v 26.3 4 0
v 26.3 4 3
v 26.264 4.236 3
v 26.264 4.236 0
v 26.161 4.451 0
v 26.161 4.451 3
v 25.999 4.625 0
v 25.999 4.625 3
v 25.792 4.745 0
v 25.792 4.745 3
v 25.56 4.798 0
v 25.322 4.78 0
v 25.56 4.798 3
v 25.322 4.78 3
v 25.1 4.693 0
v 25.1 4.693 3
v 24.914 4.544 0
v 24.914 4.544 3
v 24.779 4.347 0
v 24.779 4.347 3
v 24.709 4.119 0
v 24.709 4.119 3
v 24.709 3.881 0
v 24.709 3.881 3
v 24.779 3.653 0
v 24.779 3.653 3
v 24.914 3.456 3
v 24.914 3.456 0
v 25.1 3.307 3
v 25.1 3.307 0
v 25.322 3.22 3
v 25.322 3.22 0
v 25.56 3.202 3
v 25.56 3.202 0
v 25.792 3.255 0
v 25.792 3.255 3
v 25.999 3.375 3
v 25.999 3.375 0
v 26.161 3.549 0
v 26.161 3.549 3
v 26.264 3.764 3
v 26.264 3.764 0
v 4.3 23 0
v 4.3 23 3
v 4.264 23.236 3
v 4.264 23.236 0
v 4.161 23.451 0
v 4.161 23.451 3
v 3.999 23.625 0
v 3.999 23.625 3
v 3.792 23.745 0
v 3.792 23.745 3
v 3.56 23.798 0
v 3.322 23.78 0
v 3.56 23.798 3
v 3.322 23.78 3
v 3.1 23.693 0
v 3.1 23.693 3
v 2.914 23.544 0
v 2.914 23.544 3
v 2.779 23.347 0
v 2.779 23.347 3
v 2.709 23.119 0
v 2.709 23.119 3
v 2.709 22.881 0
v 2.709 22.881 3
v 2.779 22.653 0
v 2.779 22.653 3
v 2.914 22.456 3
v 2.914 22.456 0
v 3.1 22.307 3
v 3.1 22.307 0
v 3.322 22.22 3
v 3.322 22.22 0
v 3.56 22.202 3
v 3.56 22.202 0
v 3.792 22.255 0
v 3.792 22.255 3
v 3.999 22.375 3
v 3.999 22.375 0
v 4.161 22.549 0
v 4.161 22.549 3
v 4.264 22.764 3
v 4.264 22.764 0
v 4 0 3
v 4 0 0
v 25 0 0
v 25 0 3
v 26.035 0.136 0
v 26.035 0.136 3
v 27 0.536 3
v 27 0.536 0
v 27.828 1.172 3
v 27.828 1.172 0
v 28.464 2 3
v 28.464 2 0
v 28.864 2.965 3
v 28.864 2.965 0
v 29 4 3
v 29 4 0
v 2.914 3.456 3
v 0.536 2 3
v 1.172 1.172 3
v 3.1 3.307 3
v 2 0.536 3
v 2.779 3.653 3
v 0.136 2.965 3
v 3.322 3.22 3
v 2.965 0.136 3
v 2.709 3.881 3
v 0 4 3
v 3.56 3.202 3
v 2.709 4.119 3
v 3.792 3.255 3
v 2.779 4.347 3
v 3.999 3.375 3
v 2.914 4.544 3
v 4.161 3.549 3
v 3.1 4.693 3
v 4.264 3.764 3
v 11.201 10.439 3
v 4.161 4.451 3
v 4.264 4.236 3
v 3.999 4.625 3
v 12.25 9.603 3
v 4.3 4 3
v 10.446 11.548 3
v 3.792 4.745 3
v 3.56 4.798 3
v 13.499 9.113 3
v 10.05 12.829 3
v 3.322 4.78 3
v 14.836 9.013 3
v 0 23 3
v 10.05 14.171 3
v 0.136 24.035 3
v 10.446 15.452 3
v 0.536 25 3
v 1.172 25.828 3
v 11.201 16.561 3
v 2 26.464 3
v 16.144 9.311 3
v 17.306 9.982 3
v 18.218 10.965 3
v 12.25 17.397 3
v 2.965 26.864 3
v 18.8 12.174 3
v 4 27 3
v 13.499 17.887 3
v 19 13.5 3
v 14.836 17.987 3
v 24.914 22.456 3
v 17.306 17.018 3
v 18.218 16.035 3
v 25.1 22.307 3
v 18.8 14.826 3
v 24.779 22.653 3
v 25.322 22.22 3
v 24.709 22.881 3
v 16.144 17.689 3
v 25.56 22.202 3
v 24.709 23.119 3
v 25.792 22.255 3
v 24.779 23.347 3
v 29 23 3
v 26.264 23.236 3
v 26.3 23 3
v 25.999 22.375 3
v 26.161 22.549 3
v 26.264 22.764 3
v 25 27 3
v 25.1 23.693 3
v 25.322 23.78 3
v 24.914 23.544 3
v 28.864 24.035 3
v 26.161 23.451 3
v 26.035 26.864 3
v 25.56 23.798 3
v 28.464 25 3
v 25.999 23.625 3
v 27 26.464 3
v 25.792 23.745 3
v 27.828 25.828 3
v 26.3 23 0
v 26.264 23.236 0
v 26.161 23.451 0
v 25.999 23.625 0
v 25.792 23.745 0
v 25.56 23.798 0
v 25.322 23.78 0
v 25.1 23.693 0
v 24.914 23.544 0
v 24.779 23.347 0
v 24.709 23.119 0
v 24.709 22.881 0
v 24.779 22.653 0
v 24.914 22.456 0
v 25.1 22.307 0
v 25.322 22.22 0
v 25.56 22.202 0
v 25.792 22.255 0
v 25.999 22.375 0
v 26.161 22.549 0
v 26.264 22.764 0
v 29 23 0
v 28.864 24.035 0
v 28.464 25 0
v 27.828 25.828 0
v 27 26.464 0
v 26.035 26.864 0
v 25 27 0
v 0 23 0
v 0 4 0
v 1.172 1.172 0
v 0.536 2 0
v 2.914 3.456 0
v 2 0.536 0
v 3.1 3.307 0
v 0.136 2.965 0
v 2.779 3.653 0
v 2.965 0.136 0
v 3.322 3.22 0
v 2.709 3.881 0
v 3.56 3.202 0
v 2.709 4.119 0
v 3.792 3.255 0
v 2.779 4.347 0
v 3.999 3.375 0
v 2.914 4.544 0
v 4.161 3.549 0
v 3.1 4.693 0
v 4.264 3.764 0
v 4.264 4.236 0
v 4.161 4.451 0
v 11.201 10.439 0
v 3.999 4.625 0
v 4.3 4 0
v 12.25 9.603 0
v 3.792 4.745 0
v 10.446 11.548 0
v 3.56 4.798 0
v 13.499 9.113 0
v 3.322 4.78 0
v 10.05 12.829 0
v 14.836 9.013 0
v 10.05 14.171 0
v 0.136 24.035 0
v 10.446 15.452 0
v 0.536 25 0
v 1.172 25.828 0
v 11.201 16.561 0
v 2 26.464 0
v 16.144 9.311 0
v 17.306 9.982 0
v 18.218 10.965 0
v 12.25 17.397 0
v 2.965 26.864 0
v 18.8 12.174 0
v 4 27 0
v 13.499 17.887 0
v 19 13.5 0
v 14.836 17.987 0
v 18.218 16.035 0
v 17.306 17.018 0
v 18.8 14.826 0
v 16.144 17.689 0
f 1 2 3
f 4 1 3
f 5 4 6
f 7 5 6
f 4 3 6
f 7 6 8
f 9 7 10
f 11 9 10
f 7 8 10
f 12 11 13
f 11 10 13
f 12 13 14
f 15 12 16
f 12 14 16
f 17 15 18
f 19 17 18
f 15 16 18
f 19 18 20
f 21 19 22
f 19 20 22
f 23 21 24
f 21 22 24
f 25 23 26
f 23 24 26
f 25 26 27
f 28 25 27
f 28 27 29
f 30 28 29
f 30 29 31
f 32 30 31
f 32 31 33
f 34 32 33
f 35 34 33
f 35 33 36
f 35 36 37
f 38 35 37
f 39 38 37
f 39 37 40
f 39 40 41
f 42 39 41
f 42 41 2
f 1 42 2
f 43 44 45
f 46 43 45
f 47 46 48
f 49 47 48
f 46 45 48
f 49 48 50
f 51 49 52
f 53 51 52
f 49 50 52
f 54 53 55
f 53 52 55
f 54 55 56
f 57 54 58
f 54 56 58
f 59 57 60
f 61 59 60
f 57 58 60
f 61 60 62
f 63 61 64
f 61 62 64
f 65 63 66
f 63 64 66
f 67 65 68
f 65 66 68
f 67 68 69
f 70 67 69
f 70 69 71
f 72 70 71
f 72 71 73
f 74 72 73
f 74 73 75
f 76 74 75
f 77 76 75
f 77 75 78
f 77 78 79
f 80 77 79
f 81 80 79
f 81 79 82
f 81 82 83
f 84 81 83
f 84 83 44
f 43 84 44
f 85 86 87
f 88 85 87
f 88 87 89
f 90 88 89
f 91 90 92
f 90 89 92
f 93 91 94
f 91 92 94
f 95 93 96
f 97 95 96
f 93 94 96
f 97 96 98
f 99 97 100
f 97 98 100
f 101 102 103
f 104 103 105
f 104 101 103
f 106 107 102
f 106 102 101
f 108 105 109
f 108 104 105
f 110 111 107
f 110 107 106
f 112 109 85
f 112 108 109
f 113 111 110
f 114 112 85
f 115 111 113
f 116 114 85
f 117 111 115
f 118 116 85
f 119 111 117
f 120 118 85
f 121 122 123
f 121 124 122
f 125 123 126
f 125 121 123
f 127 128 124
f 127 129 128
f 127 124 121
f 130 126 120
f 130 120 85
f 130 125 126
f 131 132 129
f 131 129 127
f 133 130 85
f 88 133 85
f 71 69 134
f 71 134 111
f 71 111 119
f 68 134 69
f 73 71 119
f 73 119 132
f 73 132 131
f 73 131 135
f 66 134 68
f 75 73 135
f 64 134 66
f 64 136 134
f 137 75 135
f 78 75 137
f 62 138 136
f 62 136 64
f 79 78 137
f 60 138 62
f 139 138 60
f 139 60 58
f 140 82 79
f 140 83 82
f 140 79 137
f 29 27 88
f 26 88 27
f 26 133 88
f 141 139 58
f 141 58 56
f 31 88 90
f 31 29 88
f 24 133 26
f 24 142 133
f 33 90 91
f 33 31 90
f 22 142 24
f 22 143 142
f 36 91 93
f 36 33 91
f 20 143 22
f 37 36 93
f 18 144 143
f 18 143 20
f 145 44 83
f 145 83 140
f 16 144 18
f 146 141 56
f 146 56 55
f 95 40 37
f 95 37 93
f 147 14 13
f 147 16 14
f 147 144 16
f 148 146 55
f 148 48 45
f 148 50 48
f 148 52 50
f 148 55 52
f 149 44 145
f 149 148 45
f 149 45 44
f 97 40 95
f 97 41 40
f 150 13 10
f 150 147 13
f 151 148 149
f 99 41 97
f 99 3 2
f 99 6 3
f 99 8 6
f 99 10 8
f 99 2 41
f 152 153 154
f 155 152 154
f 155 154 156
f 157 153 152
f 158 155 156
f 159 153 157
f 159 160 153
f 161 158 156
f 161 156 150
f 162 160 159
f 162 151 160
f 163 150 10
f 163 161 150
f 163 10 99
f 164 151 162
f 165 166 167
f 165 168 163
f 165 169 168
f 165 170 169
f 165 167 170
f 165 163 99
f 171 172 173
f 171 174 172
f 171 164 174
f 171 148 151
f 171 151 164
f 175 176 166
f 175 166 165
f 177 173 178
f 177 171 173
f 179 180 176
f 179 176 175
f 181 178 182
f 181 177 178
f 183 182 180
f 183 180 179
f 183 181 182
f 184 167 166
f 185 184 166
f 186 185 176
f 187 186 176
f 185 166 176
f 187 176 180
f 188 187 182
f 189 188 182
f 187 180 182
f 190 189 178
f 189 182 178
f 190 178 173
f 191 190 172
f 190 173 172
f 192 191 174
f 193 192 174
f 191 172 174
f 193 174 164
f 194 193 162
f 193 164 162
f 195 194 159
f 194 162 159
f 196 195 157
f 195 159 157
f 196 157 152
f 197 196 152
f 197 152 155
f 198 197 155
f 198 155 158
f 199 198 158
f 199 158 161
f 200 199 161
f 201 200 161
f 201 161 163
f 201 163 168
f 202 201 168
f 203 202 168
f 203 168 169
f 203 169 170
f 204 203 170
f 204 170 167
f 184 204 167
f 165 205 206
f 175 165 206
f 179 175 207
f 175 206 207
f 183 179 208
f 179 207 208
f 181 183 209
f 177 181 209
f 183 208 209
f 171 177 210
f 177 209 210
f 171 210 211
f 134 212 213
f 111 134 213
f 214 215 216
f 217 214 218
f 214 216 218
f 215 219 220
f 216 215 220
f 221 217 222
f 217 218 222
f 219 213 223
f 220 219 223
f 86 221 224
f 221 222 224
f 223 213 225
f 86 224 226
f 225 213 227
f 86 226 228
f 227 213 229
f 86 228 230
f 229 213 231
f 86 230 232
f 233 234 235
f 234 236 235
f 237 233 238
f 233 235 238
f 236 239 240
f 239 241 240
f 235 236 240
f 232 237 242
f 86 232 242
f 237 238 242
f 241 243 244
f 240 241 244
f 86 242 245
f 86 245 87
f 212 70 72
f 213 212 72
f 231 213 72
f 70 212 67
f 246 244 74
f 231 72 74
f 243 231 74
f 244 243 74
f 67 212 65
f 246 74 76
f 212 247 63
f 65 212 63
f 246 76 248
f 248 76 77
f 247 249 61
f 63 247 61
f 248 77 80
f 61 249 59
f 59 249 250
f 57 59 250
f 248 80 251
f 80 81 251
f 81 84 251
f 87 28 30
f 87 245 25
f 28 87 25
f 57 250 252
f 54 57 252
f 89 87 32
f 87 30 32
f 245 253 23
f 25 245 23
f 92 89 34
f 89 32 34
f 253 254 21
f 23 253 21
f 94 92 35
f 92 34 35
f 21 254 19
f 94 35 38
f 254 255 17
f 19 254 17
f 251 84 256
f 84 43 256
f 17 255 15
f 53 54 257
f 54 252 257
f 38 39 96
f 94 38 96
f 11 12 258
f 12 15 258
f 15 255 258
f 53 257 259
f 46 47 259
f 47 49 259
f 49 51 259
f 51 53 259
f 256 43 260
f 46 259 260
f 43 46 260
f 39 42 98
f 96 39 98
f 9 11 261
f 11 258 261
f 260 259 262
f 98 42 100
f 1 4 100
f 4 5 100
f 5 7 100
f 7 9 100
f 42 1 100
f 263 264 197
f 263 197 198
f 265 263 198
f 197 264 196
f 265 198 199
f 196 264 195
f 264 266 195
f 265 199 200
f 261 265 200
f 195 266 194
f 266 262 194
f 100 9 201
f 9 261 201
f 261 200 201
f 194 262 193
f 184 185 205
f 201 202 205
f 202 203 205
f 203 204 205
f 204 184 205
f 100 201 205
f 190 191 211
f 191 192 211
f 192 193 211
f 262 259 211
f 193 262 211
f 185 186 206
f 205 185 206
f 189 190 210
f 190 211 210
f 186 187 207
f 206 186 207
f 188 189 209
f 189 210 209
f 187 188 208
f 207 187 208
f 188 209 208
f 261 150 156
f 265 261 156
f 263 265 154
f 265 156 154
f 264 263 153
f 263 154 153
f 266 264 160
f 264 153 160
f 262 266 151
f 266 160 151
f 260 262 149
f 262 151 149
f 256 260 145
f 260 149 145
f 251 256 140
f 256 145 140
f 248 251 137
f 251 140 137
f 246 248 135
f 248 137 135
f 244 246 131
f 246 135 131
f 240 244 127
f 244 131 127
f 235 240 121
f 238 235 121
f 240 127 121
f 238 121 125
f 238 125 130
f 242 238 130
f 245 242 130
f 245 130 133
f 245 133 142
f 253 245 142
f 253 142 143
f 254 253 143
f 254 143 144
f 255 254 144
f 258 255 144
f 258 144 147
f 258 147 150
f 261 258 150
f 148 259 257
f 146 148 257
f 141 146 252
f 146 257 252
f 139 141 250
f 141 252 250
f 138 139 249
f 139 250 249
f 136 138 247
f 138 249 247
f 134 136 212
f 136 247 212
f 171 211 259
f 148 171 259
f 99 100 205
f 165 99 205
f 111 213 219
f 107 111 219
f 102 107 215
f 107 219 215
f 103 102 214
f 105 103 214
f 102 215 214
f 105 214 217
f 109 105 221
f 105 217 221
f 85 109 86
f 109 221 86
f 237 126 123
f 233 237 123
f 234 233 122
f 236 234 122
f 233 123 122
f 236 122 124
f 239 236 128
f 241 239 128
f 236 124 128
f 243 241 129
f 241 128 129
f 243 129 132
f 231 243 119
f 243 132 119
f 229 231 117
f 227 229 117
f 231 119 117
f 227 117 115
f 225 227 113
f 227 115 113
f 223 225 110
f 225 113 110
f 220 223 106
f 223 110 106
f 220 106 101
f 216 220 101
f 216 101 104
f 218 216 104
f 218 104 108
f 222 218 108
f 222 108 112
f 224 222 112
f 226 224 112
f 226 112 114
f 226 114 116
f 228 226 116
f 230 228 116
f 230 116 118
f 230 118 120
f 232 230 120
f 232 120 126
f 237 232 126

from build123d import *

# Parameters (mm, degrees)
EXTRUDE_1_DEPTH     = 3
SKETCH_2_R          = 4.5
CUT_EXTRUDE_1_DEPTH = 40.736632973
SKETCH_3_R          = 0.8
CUT_EXTRUDE_2_DEPTH = 40.736632973


with BuildPart() as part:
    # Эскиз1 → Бобышка-Вытянуть1 (new body)
    with BuildSketch(Plane.XY):
        with BuildLine():
            Line((4, 0), (25, 0))
            ThreePointArc((25, 0), (27.828427125, 1.171572875), (29, 4))
            Line((29, 4), (29, 23))
            ThreePointArc((29, 23), (27.828427125, 25.828427125), (25, 27))
            Line((25, 27), (4, 27))
            ThreePointArc((4, 27), (1.171572875, 25.828427125), (0, 23))
            Line((0, 23), (0, 4))
            ThreePointArc((0, 4), (1.171572875, 1.171572875), (4, 0))
        make_face()
    extrude(amount=EXTRUDE_1_DEPTH)

    # Эскиз2 → Вырез-Вытянуть1 (cut, through all)
    with BuildSketch(Plane.XY.offset(3)):
        with Locations((14.5, 13.5)):
            Circle(SKETCH_2_R)
    extrude(amount=-CUT_EXTRUDE_1_DEPTH, mode=Mode.SUBTRACT)

    # Эскиз3 → Вырез-Вытянуть2 (cut, through all)
    with BuildSketch(Plane.XY.offset(3)):
        with Locations((3.5, 4)):
            Circle(SKETCH_3_R)
        with Locations((25.5, 4)):
            Circle(SKETCH_3_R)
        with Locations((25.5, 23)):
            Circle(SKETCH_3_R)
        with Locations((3.5, 23)):
            Circle(SKETCH_3_R)
    extrude(amount=-CUT_EXTRUDE_2_DEPTH, mode=Mode.SUBTRACT)


solid = part.part
